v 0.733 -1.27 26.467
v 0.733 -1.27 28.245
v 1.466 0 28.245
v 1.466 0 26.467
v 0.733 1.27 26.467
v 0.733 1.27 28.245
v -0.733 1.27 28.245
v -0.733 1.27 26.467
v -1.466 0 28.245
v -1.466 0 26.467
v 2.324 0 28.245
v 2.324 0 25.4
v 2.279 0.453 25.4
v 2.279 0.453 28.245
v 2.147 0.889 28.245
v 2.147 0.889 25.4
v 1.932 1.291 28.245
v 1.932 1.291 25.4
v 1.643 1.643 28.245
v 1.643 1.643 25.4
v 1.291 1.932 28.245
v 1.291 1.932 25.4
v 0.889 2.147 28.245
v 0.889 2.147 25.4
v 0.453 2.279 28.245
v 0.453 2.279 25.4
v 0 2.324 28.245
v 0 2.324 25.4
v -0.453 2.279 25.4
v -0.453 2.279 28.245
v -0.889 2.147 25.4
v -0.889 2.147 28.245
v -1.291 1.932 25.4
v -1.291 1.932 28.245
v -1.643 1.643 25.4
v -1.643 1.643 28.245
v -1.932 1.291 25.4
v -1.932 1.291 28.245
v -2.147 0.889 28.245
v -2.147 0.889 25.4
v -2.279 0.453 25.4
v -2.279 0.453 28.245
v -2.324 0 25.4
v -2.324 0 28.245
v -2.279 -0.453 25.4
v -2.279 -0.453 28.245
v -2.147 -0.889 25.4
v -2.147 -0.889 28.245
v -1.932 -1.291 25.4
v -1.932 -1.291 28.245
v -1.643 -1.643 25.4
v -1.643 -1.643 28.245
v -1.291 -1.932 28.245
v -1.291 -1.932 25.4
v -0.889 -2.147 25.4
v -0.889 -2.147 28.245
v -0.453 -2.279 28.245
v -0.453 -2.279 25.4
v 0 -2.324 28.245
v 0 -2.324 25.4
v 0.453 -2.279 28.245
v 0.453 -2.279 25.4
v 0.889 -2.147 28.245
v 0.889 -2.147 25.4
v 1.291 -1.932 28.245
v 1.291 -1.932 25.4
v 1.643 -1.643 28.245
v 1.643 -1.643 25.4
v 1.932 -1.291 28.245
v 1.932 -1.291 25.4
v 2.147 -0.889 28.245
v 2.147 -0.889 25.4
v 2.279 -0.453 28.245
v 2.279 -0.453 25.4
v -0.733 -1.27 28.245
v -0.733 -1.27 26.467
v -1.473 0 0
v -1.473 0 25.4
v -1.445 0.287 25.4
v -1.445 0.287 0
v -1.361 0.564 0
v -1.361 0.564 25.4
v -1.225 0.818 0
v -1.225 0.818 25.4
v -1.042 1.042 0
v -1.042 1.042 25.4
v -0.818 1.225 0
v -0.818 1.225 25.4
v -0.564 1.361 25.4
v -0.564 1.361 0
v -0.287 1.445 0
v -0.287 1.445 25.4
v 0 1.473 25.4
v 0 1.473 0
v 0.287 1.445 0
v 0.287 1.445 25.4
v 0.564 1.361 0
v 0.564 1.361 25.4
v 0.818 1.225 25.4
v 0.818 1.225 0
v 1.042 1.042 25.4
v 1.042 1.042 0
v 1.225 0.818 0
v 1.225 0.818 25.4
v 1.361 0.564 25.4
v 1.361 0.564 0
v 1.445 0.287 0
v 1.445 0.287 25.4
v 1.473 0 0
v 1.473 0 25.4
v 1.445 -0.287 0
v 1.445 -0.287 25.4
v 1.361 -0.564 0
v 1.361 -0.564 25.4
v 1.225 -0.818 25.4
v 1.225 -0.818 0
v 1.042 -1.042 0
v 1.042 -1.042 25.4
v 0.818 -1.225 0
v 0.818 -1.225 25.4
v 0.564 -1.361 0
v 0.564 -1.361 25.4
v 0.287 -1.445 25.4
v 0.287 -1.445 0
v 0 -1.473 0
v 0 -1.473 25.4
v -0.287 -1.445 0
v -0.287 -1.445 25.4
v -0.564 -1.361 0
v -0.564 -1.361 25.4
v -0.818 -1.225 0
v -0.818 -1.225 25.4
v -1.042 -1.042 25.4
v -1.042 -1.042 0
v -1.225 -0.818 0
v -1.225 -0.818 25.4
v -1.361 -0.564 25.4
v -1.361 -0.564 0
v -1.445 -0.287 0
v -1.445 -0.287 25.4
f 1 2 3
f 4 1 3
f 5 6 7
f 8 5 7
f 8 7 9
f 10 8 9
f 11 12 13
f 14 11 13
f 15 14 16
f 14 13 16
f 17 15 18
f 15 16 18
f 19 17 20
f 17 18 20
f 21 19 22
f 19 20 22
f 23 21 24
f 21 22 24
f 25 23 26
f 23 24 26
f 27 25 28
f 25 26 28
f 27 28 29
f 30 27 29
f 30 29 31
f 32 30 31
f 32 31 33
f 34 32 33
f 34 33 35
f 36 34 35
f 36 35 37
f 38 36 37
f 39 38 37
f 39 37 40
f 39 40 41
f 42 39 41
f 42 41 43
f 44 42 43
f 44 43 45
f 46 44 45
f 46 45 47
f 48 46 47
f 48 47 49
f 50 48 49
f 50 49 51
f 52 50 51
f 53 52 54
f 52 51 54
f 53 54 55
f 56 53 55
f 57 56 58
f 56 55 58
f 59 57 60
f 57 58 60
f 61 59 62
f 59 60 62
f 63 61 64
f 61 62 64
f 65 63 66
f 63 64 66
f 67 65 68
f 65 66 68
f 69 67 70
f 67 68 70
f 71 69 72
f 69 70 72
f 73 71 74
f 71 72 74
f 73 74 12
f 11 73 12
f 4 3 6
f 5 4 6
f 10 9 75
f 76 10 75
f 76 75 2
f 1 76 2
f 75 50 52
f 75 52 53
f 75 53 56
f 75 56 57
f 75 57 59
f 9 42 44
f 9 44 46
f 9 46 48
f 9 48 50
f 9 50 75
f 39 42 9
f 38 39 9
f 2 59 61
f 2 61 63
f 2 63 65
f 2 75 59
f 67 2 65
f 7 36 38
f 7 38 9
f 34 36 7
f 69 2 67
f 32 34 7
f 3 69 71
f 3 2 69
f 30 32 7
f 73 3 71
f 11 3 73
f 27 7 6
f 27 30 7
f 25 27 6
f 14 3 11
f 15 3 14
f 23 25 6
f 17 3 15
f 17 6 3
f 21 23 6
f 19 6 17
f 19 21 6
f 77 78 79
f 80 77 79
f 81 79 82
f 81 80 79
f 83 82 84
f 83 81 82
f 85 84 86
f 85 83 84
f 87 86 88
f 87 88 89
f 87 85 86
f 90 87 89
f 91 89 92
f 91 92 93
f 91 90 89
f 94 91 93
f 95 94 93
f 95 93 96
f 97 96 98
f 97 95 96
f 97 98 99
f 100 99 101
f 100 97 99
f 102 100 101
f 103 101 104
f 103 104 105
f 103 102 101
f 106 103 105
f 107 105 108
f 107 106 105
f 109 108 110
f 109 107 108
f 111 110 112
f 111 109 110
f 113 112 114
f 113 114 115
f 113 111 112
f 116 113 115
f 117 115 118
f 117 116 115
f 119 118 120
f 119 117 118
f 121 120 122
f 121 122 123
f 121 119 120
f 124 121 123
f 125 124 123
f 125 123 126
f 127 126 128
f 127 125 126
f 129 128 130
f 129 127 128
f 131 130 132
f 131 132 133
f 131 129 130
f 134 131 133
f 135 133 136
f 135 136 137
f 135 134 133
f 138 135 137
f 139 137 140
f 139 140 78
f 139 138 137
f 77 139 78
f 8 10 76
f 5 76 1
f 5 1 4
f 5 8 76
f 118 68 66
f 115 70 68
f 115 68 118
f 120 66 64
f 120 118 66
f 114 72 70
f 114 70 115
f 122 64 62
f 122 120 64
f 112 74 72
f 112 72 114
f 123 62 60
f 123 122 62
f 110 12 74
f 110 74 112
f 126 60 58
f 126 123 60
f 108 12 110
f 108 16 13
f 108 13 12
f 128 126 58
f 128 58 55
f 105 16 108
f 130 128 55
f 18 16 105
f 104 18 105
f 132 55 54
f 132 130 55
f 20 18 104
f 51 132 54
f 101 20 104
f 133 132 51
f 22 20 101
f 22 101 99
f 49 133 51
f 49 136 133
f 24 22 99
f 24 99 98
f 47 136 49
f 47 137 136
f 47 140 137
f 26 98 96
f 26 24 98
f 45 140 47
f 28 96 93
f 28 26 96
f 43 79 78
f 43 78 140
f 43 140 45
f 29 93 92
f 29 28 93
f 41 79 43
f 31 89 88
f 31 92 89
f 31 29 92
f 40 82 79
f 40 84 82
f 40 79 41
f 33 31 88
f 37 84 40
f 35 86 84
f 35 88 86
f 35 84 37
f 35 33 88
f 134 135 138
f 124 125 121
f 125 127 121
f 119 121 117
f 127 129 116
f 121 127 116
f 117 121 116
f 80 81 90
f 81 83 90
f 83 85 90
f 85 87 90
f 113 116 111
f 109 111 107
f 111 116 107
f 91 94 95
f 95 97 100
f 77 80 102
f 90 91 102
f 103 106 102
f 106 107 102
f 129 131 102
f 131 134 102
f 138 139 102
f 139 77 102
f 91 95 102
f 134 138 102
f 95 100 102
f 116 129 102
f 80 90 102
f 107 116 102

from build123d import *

# Parameters (mm, degrees)
SKETCH1_R         = 2.3241
EXTRUDE1_DEPTH    = 28.2448
SKETCH3_OUTSIDE_W = 12.448
SKETCH3_OUTSIDE_H = 12.448
SKETCH3_OUTSIDE_R = 1.4732
EXTRUDE2_DEPTH    = 25.4
EXTRUDE3_DEPTH    = 1.778


with BuildPart() as part:
    # Sketch1 → Extrude1 (new body)
    with BuildSketch(Plane.XY):
        Circle(SKETCH1_R)
    extrude(amount=EXTRUDE1_DEPTH)

    # Sketch3 outside → Extrude2 (cut)
    with BuildSketch(Plane(origin=(0, 0, 0), x_dir=(-1, 0, 0), z_dir=(0, 0, -1))):
        Rectangle(SKETCH3_OUTSIDE_W, SKETCH3_OUTSIDE_H)
        Circle(SKETCH3_OUTSIDE_R, mode=Mode.SUBTRACT)
    extrude(amount=-EXTRUDE2_DEPTH, mode=Mode.SUBTRACT)

    # Sketch4 → Extrude3 (cut)
    with BuildSketch(Plane.XY.offset(28.2448)):
        Polygon((1.466469684, 0), (0.733234842, 1.27), (-0.733234842, 1.27), (-1.466469684, 0), (-0.733234842, -1.27), (0.733234842, -1.27), align=None)
    extrude(amount=-EXTRUDE3_DEPTH, mode=Mode.SUBTRACT)


solid = part.part
